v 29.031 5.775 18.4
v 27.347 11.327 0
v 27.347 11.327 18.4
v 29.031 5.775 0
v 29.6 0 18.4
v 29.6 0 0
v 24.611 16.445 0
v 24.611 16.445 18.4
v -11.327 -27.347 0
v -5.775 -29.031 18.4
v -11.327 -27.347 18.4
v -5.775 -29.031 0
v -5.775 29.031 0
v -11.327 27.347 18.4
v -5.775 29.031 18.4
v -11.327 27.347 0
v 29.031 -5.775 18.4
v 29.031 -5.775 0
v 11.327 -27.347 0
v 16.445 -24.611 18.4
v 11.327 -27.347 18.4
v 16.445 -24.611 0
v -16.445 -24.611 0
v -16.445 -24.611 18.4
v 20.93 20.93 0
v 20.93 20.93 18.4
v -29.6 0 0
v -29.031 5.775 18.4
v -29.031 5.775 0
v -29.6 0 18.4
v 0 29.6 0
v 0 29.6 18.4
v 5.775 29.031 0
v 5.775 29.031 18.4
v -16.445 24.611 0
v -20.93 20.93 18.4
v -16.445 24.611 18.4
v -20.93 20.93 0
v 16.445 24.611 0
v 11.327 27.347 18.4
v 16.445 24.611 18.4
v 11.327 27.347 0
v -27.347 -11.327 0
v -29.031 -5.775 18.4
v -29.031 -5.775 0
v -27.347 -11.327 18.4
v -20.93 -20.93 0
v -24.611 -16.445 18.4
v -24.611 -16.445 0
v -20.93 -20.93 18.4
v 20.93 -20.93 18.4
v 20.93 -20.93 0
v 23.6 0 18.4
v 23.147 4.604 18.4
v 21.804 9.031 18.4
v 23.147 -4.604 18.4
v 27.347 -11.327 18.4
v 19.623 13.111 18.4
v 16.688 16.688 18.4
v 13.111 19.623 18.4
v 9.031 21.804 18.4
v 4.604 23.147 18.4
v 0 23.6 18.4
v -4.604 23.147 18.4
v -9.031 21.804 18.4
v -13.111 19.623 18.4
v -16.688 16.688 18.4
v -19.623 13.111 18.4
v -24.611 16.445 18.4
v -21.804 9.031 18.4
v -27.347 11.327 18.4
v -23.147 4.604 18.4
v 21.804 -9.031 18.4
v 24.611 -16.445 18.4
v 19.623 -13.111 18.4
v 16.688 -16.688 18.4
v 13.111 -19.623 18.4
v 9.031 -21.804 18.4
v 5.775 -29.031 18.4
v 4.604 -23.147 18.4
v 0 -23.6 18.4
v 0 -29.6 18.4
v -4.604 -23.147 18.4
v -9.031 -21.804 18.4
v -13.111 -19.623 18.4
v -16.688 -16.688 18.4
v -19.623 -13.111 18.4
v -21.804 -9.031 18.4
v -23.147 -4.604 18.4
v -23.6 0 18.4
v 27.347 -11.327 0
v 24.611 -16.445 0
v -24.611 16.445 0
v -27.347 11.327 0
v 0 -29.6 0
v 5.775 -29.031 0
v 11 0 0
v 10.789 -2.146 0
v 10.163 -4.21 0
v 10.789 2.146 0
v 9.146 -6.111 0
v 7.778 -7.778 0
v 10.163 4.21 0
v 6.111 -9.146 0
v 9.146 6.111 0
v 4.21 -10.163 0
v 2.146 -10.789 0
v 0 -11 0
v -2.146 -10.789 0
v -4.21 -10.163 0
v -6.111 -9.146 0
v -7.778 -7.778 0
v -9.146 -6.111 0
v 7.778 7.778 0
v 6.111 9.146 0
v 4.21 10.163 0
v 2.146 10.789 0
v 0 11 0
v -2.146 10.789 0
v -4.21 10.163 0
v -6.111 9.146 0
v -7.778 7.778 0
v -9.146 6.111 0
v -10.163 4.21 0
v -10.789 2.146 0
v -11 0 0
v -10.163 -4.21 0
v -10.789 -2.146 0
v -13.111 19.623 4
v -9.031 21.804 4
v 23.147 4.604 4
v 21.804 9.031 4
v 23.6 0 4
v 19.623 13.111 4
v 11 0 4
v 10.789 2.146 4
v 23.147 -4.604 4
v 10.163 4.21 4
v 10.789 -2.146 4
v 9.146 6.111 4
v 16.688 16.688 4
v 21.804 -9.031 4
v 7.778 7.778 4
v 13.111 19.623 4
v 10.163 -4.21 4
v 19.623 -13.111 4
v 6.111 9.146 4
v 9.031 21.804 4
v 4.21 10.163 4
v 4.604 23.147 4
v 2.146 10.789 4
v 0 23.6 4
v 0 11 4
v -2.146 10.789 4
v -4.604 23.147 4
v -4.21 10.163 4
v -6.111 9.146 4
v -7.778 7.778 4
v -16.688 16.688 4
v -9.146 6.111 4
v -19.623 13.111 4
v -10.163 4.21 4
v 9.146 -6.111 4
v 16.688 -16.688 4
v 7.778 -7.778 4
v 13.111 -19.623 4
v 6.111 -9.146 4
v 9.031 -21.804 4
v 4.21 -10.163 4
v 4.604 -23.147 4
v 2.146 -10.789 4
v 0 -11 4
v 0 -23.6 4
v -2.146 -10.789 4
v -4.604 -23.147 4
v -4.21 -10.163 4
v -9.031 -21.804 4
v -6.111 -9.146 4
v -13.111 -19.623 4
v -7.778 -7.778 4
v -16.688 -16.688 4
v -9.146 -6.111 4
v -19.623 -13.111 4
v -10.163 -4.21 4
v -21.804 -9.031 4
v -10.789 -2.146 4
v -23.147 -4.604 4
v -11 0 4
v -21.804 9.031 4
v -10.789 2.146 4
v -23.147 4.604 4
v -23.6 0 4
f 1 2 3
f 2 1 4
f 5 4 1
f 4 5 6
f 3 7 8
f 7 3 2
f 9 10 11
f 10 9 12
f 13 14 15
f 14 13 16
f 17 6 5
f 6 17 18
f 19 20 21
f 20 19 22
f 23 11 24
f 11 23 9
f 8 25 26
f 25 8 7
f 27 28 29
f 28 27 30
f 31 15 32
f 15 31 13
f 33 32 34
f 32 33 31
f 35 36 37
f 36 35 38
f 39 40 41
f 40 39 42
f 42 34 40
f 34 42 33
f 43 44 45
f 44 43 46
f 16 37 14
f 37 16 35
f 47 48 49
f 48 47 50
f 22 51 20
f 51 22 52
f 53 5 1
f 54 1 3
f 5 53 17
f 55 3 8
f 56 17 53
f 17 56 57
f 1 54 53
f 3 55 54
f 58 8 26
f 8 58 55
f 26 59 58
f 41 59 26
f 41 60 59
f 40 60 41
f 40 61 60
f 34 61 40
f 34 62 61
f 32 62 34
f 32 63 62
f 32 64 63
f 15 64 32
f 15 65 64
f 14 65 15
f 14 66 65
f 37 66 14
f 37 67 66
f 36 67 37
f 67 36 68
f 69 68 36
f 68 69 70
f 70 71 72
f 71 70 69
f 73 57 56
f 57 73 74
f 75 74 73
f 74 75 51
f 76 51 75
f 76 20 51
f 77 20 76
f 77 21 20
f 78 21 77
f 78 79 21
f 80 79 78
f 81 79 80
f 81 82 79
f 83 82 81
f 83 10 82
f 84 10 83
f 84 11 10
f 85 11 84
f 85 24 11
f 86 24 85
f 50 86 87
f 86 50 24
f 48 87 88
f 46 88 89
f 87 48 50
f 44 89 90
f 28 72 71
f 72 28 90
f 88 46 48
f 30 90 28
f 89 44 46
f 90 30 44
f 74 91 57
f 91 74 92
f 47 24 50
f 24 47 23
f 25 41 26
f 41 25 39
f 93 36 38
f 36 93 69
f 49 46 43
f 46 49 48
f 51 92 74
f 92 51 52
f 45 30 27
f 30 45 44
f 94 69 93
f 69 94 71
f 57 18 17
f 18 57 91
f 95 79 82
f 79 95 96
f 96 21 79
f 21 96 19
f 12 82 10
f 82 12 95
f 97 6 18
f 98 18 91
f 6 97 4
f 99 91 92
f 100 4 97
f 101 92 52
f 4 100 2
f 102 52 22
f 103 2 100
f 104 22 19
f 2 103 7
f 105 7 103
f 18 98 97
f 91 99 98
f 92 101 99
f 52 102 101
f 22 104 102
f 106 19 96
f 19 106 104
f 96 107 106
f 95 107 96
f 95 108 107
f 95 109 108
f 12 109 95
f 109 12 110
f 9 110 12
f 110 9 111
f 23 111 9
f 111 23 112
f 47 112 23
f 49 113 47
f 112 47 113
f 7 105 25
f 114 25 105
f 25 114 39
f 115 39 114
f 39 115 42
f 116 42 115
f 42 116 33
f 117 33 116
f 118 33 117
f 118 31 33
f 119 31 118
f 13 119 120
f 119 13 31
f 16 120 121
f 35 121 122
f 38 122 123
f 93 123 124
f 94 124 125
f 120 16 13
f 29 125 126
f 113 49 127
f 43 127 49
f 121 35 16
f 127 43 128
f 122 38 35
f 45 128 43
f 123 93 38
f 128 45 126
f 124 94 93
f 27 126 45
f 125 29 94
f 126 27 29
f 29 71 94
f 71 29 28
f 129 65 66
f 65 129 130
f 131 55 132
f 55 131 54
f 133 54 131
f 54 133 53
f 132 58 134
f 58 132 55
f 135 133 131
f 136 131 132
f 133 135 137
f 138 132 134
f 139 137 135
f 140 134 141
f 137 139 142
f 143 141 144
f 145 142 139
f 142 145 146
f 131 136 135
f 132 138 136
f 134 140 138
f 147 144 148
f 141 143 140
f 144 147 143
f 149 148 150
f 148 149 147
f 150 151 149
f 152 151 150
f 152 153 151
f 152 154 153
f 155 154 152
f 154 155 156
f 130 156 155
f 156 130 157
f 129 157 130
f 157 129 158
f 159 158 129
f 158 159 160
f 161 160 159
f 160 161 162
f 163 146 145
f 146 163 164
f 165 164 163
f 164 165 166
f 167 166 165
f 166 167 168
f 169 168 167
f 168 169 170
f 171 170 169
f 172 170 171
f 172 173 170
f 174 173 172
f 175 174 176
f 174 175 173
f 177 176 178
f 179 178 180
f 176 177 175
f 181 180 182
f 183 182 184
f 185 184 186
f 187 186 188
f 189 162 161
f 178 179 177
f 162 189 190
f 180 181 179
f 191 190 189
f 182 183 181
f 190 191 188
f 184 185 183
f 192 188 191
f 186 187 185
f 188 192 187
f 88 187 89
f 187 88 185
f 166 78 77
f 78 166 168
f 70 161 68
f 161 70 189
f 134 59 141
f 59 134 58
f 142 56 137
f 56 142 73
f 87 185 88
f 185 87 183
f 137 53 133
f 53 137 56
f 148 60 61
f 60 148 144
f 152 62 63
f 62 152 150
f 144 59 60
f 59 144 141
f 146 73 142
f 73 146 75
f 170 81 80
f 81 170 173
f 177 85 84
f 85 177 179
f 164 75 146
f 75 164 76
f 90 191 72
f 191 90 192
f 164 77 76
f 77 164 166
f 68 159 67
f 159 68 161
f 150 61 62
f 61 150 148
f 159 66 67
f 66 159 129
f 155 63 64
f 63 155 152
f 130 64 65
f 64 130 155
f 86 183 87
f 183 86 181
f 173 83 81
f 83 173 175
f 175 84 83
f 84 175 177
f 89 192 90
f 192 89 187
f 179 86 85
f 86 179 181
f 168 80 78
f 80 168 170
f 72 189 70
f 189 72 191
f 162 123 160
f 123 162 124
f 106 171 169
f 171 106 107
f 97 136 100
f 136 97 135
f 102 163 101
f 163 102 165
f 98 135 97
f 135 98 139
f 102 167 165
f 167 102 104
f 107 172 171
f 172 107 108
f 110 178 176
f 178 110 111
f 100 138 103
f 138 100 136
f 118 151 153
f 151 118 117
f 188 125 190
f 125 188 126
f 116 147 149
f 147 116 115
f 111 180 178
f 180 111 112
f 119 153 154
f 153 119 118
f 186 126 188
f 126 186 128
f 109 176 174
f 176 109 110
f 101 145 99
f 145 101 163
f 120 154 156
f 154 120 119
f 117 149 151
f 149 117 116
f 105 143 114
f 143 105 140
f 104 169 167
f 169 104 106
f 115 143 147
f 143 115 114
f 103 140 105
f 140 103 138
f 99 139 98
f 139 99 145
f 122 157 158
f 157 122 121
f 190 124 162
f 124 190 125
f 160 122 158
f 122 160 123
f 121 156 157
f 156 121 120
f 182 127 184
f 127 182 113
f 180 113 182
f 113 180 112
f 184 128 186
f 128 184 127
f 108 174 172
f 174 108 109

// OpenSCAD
$fn = 32;

// ----------------------------------------------------------------------
// Bearing housing: seat for 6204 (47 x 14 mm), 59.2 mm body
// ----------------------------------------------------------------------

// --- parameters (mm) ---
body_od = 59.2;           // housing outside diameter
body_h = 18.4;            // overall housing height
wall = 6;                 // wall thickness
pocket_d = 47.2;          // 6204 seat, 0.2 mm clearance
seat_h = 14.4;            // pocket depth
shoulder = 4;             // shoulder under the bearing
pass_d = 22;              // shaft passage

module body() {
  cylinder(h = body_h, d = body_od);
}

difference() {
  union() {
    body();
  }
  translate([0, 0, body_h - seat_h]) cylinder(h = seat_h + 1, d = pocket_d);
  translate([0, 0, -1]) cylinder(h = body_h - seat_h + 1, d = pass_d);
}
